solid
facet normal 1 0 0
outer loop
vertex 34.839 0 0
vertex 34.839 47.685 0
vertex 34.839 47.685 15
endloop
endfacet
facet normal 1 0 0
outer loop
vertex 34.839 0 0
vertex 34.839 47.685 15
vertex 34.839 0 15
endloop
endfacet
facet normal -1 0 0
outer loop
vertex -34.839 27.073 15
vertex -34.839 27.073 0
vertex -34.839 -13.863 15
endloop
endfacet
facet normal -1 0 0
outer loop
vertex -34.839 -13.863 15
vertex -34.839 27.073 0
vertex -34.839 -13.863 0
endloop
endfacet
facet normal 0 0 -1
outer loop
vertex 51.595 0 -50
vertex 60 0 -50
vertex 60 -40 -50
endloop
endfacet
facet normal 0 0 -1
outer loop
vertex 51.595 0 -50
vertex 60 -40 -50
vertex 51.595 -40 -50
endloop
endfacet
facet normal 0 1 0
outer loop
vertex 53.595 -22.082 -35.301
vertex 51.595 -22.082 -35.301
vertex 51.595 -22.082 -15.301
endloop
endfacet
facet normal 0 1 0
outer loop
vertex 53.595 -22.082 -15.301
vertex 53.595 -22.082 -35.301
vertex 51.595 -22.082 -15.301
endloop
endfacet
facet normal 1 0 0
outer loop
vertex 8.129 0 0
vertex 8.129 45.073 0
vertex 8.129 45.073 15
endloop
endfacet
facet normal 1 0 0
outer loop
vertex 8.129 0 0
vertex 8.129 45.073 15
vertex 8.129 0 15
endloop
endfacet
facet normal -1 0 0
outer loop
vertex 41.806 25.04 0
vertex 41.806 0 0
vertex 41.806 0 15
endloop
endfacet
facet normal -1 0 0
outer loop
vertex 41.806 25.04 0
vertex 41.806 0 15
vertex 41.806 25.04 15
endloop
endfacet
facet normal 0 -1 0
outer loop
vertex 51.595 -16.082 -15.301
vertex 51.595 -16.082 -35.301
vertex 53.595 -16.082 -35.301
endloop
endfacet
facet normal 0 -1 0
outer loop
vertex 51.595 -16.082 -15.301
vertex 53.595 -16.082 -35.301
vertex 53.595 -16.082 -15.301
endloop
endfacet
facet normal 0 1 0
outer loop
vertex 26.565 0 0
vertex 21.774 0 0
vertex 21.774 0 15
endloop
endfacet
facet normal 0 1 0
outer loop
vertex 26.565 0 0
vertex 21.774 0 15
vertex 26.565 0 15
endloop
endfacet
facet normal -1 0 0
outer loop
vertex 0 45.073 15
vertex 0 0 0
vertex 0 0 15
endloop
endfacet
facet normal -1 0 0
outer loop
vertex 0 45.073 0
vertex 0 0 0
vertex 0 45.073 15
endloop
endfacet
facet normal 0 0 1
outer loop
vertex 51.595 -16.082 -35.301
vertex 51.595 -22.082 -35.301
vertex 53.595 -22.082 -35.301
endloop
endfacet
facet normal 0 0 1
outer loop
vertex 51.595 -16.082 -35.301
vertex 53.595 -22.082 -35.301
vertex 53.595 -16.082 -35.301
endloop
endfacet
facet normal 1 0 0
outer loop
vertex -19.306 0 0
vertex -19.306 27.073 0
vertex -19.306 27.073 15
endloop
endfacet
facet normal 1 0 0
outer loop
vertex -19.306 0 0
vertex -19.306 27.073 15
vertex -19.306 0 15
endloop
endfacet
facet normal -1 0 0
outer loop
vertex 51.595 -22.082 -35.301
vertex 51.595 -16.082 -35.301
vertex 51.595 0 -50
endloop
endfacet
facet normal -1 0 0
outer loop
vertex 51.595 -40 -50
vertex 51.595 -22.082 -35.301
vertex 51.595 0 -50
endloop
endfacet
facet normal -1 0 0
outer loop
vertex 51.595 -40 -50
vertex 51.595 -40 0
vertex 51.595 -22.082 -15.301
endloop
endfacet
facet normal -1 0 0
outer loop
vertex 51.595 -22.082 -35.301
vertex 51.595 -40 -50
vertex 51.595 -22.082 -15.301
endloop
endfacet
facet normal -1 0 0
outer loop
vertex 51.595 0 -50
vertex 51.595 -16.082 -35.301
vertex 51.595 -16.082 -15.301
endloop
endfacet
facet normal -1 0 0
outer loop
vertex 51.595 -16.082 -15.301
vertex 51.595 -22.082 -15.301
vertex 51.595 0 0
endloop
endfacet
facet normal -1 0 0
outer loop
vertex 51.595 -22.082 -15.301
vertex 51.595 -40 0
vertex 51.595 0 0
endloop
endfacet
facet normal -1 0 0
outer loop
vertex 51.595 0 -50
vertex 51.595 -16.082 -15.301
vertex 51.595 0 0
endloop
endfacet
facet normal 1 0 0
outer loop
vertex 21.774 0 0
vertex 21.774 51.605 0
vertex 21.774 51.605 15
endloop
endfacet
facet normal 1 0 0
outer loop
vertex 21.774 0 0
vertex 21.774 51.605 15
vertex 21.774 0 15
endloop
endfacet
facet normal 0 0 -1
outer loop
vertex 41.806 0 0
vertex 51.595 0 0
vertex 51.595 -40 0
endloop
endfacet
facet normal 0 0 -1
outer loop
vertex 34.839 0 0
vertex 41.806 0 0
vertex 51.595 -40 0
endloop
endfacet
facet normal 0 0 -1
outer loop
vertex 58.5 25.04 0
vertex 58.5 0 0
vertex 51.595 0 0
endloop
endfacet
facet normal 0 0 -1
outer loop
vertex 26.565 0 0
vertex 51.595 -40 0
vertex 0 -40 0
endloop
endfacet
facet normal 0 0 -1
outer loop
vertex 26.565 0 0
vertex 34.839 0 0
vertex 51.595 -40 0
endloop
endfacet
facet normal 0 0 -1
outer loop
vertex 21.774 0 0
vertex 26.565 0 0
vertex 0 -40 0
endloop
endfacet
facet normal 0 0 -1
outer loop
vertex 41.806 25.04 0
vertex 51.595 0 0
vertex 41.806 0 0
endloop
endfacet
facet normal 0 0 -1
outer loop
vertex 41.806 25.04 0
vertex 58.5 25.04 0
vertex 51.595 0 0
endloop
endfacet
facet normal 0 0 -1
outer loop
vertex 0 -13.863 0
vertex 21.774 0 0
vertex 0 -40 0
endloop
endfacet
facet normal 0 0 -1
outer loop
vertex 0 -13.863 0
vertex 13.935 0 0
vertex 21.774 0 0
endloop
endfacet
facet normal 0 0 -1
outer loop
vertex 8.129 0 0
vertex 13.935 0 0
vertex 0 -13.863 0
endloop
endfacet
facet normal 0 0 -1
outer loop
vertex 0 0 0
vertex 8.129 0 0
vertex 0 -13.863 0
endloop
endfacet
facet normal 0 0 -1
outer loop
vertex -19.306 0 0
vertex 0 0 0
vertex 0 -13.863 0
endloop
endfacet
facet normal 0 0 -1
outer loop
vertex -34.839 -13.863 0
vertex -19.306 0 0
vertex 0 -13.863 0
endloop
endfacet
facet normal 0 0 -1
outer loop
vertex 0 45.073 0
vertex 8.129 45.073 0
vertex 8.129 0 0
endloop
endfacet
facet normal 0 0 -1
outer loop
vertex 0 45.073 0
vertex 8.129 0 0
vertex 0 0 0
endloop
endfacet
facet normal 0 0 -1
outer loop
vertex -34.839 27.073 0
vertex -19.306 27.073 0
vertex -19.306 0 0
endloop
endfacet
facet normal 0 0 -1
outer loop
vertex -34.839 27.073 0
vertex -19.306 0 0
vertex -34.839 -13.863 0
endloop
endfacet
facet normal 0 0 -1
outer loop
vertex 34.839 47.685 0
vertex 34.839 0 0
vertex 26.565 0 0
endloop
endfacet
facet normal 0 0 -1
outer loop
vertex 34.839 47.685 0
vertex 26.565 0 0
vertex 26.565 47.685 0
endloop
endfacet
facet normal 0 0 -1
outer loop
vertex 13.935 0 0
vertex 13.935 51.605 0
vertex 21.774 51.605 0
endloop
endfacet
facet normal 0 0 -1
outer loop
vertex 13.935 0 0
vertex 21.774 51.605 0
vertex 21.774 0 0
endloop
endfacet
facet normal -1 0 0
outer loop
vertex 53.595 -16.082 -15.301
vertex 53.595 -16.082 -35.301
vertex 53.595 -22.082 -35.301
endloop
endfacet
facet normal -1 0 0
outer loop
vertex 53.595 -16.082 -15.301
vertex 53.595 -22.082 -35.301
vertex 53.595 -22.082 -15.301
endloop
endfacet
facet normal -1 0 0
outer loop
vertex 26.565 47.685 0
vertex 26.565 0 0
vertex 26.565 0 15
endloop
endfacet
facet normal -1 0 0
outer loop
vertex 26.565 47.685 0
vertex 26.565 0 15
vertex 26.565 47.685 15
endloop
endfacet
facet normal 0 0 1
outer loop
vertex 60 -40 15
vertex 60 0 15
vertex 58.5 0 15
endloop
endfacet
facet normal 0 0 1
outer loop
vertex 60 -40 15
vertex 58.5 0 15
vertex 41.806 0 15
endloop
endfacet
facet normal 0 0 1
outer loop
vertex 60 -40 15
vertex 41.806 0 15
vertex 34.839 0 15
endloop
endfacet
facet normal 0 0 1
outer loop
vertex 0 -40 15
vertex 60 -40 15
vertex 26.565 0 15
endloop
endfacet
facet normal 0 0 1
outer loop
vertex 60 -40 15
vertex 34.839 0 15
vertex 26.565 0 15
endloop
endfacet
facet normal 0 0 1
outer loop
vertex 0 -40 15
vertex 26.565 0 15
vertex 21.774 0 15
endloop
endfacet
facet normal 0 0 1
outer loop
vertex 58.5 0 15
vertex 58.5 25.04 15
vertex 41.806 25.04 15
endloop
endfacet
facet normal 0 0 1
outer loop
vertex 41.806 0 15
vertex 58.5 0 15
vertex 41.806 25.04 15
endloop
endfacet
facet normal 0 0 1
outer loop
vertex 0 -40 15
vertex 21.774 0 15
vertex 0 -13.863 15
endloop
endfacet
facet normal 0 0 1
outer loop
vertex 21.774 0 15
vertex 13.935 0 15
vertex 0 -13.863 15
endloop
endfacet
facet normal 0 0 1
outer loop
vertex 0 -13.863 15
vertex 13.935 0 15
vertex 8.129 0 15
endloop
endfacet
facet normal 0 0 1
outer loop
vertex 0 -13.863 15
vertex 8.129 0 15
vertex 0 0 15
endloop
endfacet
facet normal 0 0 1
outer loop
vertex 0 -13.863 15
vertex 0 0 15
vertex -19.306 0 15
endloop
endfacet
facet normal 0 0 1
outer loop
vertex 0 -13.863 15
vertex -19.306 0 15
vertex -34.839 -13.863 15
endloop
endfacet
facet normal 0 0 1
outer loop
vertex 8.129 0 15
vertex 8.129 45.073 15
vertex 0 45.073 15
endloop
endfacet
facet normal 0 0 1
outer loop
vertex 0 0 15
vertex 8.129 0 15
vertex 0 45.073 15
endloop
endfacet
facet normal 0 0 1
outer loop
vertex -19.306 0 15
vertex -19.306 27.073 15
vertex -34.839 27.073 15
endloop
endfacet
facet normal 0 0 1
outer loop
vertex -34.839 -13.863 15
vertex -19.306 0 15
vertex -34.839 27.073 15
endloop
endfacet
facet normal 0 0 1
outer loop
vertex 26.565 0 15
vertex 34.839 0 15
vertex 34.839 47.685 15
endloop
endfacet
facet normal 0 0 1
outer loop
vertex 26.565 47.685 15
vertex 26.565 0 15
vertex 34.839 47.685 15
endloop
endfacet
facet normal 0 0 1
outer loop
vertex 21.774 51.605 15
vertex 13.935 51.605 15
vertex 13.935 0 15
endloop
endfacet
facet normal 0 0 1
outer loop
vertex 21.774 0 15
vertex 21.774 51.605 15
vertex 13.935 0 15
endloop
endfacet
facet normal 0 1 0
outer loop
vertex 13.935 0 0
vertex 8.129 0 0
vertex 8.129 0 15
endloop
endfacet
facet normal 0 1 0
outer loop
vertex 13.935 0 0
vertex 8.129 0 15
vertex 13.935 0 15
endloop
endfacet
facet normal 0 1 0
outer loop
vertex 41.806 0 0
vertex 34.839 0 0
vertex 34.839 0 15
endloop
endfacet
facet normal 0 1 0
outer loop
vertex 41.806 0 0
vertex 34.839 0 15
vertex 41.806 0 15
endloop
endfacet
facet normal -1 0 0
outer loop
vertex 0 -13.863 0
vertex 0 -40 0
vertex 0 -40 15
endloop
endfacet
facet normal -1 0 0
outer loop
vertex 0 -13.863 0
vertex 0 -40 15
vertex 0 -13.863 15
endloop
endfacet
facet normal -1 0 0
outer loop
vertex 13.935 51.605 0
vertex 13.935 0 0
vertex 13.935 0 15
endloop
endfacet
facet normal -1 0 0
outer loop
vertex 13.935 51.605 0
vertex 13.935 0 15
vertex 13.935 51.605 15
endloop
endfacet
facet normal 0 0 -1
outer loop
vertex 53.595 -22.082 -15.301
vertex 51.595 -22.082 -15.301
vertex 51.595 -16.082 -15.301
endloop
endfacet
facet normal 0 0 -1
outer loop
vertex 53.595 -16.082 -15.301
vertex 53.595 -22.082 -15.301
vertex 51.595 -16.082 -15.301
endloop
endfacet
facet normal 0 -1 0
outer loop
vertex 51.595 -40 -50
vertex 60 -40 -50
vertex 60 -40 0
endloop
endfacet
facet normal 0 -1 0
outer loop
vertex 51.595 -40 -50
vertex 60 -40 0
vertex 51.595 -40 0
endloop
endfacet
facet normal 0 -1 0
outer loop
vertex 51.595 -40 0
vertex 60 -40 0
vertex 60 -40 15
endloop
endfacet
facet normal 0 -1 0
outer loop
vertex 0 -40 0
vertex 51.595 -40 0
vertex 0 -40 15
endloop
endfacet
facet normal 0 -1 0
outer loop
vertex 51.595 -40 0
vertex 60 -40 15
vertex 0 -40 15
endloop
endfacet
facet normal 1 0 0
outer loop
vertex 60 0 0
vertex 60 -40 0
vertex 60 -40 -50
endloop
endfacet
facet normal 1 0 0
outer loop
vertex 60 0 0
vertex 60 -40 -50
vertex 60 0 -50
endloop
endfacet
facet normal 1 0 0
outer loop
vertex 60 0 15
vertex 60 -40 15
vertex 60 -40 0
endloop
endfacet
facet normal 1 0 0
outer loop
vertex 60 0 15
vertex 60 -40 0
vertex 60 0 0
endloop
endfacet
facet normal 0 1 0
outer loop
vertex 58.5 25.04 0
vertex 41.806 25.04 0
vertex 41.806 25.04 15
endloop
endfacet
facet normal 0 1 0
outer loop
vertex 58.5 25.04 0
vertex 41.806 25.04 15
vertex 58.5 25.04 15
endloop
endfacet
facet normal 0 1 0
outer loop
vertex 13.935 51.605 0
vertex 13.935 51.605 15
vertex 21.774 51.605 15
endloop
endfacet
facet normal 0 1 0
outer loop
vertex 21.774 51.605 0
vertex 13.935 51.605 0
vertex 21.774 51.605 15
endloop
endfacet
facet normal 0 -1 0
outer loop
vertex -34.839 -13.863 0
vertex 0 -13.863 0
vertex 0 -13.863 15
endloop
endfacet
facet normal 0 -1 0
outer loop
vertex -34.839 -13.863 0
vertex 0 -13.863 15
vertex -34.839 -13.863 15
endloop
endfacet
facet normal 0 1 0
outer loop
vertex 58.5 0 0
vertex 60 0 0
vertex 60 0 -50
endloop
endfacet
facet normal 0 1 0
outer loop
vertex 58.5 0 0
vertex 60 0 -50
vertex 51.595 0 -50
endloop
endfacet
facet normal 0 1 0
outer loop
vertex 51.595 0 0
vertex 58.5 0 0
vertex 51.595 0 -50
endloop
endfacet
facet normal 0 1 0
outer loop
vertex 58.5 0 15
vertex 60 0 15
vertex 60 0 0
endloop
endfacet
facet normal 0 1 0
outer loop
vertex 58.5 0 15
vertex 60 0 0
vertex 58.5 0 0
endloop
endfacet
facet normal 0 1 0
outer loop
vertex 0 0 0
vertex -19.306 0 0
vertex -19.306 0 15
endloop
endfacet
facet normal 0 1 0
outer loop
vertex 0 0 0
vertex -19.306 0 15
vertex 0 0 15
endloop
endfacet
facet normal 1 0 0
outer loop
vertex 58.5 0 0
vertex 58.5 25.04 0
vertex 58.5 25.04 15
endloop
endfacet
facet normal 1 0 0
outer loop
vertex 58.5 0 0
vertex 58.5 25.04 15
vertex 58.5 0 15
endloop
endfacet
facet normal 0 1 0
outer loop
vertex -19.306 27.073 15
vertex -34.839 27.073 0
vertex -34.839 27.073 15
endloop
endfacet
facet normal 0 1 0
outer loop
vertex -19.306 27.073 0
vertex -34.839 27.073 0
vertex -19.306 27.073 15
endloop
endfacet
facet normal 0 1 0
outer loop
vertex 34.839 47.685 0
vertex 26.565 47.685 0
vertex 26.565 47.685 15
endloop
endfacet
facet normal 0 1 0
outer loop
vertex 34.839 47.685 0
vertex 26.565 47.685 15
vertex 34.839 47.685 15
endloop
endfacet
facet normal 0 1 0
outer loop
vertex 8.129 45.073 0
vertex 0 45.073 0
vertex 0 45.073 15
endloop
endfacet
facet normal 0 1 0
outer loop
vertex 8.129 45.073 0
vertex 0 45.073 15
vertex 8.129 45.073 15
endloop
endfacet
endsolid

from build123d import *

# Parameters (mm, degrees)
BOSS_EXTRUDE1_DEPTH = 15
SKETCH2_W           = 8.404533339
SKETCH2_H           = 40
BOSS_EXTRUDE2_DEPTH = 50
SKETCH3_W           = 20
SKETCH3_H           = 6
CUT_EXTRUDE1_DEPTH  = 2


with BuildPart() as part:
    # Sketch1 → Boss-Extrude1 (new body)
    with BuildSketch(Plane.XY):
        Polygon((21.774193548, 0), (26.564516129, 0), (26.564516129, 47.685483871), (34.838709677, 47.685483871), (34.838709677, 0), (41.806451613, 0), (41.806451613, 25.040322581), (58.5, 25.040322581), (58.5, 0), (60, 0), (60, -40), (0, -40), (0, -13.862903226), (-34.838709677, -13.862903226), (-34.838709677, 0), (-34.838709677, 27.072580645), (-19.306451613, 27.072580645), (-19.306451613, 0), (0, 0), (0, 45.072580645), (8.129032258, 45.072580645), (8.129032258, 0), (13.935483871, 0), (13.935483871, 51.60483871), (21.774193548, 51.60483871), align=None)
    extrude(amount=BOSS_EXTRUDE1_DEPTH)

    # Sketch2 → Boss-Extrude2 (add)
    with BuildSketch(Plane(origin=(0, 0, 0), x_dir=(-1, 0, 0), z_dir=(0, 0, -1))):
        with Locations((-55.797733331, -20)):
            Rectangle(SKETCH2_W, SKETCH2_H)
    extrude(amount=BOSS_EXTRUDE2_DEPTH)

    # Sketch3 → Cut-Extrude1 (cut)
    with BuildSketch(Plane.ZY.offset(-51.595466661)):
        with Locations((-25.300512309, -19.08245708)):
            Rectangle(SKETCH3_W, SKETCH3_H)
    extrude(amount=-CUT_EXTRUDE1_DEPTH, mode=Mode.SUBTRACT)


solid = part.part
